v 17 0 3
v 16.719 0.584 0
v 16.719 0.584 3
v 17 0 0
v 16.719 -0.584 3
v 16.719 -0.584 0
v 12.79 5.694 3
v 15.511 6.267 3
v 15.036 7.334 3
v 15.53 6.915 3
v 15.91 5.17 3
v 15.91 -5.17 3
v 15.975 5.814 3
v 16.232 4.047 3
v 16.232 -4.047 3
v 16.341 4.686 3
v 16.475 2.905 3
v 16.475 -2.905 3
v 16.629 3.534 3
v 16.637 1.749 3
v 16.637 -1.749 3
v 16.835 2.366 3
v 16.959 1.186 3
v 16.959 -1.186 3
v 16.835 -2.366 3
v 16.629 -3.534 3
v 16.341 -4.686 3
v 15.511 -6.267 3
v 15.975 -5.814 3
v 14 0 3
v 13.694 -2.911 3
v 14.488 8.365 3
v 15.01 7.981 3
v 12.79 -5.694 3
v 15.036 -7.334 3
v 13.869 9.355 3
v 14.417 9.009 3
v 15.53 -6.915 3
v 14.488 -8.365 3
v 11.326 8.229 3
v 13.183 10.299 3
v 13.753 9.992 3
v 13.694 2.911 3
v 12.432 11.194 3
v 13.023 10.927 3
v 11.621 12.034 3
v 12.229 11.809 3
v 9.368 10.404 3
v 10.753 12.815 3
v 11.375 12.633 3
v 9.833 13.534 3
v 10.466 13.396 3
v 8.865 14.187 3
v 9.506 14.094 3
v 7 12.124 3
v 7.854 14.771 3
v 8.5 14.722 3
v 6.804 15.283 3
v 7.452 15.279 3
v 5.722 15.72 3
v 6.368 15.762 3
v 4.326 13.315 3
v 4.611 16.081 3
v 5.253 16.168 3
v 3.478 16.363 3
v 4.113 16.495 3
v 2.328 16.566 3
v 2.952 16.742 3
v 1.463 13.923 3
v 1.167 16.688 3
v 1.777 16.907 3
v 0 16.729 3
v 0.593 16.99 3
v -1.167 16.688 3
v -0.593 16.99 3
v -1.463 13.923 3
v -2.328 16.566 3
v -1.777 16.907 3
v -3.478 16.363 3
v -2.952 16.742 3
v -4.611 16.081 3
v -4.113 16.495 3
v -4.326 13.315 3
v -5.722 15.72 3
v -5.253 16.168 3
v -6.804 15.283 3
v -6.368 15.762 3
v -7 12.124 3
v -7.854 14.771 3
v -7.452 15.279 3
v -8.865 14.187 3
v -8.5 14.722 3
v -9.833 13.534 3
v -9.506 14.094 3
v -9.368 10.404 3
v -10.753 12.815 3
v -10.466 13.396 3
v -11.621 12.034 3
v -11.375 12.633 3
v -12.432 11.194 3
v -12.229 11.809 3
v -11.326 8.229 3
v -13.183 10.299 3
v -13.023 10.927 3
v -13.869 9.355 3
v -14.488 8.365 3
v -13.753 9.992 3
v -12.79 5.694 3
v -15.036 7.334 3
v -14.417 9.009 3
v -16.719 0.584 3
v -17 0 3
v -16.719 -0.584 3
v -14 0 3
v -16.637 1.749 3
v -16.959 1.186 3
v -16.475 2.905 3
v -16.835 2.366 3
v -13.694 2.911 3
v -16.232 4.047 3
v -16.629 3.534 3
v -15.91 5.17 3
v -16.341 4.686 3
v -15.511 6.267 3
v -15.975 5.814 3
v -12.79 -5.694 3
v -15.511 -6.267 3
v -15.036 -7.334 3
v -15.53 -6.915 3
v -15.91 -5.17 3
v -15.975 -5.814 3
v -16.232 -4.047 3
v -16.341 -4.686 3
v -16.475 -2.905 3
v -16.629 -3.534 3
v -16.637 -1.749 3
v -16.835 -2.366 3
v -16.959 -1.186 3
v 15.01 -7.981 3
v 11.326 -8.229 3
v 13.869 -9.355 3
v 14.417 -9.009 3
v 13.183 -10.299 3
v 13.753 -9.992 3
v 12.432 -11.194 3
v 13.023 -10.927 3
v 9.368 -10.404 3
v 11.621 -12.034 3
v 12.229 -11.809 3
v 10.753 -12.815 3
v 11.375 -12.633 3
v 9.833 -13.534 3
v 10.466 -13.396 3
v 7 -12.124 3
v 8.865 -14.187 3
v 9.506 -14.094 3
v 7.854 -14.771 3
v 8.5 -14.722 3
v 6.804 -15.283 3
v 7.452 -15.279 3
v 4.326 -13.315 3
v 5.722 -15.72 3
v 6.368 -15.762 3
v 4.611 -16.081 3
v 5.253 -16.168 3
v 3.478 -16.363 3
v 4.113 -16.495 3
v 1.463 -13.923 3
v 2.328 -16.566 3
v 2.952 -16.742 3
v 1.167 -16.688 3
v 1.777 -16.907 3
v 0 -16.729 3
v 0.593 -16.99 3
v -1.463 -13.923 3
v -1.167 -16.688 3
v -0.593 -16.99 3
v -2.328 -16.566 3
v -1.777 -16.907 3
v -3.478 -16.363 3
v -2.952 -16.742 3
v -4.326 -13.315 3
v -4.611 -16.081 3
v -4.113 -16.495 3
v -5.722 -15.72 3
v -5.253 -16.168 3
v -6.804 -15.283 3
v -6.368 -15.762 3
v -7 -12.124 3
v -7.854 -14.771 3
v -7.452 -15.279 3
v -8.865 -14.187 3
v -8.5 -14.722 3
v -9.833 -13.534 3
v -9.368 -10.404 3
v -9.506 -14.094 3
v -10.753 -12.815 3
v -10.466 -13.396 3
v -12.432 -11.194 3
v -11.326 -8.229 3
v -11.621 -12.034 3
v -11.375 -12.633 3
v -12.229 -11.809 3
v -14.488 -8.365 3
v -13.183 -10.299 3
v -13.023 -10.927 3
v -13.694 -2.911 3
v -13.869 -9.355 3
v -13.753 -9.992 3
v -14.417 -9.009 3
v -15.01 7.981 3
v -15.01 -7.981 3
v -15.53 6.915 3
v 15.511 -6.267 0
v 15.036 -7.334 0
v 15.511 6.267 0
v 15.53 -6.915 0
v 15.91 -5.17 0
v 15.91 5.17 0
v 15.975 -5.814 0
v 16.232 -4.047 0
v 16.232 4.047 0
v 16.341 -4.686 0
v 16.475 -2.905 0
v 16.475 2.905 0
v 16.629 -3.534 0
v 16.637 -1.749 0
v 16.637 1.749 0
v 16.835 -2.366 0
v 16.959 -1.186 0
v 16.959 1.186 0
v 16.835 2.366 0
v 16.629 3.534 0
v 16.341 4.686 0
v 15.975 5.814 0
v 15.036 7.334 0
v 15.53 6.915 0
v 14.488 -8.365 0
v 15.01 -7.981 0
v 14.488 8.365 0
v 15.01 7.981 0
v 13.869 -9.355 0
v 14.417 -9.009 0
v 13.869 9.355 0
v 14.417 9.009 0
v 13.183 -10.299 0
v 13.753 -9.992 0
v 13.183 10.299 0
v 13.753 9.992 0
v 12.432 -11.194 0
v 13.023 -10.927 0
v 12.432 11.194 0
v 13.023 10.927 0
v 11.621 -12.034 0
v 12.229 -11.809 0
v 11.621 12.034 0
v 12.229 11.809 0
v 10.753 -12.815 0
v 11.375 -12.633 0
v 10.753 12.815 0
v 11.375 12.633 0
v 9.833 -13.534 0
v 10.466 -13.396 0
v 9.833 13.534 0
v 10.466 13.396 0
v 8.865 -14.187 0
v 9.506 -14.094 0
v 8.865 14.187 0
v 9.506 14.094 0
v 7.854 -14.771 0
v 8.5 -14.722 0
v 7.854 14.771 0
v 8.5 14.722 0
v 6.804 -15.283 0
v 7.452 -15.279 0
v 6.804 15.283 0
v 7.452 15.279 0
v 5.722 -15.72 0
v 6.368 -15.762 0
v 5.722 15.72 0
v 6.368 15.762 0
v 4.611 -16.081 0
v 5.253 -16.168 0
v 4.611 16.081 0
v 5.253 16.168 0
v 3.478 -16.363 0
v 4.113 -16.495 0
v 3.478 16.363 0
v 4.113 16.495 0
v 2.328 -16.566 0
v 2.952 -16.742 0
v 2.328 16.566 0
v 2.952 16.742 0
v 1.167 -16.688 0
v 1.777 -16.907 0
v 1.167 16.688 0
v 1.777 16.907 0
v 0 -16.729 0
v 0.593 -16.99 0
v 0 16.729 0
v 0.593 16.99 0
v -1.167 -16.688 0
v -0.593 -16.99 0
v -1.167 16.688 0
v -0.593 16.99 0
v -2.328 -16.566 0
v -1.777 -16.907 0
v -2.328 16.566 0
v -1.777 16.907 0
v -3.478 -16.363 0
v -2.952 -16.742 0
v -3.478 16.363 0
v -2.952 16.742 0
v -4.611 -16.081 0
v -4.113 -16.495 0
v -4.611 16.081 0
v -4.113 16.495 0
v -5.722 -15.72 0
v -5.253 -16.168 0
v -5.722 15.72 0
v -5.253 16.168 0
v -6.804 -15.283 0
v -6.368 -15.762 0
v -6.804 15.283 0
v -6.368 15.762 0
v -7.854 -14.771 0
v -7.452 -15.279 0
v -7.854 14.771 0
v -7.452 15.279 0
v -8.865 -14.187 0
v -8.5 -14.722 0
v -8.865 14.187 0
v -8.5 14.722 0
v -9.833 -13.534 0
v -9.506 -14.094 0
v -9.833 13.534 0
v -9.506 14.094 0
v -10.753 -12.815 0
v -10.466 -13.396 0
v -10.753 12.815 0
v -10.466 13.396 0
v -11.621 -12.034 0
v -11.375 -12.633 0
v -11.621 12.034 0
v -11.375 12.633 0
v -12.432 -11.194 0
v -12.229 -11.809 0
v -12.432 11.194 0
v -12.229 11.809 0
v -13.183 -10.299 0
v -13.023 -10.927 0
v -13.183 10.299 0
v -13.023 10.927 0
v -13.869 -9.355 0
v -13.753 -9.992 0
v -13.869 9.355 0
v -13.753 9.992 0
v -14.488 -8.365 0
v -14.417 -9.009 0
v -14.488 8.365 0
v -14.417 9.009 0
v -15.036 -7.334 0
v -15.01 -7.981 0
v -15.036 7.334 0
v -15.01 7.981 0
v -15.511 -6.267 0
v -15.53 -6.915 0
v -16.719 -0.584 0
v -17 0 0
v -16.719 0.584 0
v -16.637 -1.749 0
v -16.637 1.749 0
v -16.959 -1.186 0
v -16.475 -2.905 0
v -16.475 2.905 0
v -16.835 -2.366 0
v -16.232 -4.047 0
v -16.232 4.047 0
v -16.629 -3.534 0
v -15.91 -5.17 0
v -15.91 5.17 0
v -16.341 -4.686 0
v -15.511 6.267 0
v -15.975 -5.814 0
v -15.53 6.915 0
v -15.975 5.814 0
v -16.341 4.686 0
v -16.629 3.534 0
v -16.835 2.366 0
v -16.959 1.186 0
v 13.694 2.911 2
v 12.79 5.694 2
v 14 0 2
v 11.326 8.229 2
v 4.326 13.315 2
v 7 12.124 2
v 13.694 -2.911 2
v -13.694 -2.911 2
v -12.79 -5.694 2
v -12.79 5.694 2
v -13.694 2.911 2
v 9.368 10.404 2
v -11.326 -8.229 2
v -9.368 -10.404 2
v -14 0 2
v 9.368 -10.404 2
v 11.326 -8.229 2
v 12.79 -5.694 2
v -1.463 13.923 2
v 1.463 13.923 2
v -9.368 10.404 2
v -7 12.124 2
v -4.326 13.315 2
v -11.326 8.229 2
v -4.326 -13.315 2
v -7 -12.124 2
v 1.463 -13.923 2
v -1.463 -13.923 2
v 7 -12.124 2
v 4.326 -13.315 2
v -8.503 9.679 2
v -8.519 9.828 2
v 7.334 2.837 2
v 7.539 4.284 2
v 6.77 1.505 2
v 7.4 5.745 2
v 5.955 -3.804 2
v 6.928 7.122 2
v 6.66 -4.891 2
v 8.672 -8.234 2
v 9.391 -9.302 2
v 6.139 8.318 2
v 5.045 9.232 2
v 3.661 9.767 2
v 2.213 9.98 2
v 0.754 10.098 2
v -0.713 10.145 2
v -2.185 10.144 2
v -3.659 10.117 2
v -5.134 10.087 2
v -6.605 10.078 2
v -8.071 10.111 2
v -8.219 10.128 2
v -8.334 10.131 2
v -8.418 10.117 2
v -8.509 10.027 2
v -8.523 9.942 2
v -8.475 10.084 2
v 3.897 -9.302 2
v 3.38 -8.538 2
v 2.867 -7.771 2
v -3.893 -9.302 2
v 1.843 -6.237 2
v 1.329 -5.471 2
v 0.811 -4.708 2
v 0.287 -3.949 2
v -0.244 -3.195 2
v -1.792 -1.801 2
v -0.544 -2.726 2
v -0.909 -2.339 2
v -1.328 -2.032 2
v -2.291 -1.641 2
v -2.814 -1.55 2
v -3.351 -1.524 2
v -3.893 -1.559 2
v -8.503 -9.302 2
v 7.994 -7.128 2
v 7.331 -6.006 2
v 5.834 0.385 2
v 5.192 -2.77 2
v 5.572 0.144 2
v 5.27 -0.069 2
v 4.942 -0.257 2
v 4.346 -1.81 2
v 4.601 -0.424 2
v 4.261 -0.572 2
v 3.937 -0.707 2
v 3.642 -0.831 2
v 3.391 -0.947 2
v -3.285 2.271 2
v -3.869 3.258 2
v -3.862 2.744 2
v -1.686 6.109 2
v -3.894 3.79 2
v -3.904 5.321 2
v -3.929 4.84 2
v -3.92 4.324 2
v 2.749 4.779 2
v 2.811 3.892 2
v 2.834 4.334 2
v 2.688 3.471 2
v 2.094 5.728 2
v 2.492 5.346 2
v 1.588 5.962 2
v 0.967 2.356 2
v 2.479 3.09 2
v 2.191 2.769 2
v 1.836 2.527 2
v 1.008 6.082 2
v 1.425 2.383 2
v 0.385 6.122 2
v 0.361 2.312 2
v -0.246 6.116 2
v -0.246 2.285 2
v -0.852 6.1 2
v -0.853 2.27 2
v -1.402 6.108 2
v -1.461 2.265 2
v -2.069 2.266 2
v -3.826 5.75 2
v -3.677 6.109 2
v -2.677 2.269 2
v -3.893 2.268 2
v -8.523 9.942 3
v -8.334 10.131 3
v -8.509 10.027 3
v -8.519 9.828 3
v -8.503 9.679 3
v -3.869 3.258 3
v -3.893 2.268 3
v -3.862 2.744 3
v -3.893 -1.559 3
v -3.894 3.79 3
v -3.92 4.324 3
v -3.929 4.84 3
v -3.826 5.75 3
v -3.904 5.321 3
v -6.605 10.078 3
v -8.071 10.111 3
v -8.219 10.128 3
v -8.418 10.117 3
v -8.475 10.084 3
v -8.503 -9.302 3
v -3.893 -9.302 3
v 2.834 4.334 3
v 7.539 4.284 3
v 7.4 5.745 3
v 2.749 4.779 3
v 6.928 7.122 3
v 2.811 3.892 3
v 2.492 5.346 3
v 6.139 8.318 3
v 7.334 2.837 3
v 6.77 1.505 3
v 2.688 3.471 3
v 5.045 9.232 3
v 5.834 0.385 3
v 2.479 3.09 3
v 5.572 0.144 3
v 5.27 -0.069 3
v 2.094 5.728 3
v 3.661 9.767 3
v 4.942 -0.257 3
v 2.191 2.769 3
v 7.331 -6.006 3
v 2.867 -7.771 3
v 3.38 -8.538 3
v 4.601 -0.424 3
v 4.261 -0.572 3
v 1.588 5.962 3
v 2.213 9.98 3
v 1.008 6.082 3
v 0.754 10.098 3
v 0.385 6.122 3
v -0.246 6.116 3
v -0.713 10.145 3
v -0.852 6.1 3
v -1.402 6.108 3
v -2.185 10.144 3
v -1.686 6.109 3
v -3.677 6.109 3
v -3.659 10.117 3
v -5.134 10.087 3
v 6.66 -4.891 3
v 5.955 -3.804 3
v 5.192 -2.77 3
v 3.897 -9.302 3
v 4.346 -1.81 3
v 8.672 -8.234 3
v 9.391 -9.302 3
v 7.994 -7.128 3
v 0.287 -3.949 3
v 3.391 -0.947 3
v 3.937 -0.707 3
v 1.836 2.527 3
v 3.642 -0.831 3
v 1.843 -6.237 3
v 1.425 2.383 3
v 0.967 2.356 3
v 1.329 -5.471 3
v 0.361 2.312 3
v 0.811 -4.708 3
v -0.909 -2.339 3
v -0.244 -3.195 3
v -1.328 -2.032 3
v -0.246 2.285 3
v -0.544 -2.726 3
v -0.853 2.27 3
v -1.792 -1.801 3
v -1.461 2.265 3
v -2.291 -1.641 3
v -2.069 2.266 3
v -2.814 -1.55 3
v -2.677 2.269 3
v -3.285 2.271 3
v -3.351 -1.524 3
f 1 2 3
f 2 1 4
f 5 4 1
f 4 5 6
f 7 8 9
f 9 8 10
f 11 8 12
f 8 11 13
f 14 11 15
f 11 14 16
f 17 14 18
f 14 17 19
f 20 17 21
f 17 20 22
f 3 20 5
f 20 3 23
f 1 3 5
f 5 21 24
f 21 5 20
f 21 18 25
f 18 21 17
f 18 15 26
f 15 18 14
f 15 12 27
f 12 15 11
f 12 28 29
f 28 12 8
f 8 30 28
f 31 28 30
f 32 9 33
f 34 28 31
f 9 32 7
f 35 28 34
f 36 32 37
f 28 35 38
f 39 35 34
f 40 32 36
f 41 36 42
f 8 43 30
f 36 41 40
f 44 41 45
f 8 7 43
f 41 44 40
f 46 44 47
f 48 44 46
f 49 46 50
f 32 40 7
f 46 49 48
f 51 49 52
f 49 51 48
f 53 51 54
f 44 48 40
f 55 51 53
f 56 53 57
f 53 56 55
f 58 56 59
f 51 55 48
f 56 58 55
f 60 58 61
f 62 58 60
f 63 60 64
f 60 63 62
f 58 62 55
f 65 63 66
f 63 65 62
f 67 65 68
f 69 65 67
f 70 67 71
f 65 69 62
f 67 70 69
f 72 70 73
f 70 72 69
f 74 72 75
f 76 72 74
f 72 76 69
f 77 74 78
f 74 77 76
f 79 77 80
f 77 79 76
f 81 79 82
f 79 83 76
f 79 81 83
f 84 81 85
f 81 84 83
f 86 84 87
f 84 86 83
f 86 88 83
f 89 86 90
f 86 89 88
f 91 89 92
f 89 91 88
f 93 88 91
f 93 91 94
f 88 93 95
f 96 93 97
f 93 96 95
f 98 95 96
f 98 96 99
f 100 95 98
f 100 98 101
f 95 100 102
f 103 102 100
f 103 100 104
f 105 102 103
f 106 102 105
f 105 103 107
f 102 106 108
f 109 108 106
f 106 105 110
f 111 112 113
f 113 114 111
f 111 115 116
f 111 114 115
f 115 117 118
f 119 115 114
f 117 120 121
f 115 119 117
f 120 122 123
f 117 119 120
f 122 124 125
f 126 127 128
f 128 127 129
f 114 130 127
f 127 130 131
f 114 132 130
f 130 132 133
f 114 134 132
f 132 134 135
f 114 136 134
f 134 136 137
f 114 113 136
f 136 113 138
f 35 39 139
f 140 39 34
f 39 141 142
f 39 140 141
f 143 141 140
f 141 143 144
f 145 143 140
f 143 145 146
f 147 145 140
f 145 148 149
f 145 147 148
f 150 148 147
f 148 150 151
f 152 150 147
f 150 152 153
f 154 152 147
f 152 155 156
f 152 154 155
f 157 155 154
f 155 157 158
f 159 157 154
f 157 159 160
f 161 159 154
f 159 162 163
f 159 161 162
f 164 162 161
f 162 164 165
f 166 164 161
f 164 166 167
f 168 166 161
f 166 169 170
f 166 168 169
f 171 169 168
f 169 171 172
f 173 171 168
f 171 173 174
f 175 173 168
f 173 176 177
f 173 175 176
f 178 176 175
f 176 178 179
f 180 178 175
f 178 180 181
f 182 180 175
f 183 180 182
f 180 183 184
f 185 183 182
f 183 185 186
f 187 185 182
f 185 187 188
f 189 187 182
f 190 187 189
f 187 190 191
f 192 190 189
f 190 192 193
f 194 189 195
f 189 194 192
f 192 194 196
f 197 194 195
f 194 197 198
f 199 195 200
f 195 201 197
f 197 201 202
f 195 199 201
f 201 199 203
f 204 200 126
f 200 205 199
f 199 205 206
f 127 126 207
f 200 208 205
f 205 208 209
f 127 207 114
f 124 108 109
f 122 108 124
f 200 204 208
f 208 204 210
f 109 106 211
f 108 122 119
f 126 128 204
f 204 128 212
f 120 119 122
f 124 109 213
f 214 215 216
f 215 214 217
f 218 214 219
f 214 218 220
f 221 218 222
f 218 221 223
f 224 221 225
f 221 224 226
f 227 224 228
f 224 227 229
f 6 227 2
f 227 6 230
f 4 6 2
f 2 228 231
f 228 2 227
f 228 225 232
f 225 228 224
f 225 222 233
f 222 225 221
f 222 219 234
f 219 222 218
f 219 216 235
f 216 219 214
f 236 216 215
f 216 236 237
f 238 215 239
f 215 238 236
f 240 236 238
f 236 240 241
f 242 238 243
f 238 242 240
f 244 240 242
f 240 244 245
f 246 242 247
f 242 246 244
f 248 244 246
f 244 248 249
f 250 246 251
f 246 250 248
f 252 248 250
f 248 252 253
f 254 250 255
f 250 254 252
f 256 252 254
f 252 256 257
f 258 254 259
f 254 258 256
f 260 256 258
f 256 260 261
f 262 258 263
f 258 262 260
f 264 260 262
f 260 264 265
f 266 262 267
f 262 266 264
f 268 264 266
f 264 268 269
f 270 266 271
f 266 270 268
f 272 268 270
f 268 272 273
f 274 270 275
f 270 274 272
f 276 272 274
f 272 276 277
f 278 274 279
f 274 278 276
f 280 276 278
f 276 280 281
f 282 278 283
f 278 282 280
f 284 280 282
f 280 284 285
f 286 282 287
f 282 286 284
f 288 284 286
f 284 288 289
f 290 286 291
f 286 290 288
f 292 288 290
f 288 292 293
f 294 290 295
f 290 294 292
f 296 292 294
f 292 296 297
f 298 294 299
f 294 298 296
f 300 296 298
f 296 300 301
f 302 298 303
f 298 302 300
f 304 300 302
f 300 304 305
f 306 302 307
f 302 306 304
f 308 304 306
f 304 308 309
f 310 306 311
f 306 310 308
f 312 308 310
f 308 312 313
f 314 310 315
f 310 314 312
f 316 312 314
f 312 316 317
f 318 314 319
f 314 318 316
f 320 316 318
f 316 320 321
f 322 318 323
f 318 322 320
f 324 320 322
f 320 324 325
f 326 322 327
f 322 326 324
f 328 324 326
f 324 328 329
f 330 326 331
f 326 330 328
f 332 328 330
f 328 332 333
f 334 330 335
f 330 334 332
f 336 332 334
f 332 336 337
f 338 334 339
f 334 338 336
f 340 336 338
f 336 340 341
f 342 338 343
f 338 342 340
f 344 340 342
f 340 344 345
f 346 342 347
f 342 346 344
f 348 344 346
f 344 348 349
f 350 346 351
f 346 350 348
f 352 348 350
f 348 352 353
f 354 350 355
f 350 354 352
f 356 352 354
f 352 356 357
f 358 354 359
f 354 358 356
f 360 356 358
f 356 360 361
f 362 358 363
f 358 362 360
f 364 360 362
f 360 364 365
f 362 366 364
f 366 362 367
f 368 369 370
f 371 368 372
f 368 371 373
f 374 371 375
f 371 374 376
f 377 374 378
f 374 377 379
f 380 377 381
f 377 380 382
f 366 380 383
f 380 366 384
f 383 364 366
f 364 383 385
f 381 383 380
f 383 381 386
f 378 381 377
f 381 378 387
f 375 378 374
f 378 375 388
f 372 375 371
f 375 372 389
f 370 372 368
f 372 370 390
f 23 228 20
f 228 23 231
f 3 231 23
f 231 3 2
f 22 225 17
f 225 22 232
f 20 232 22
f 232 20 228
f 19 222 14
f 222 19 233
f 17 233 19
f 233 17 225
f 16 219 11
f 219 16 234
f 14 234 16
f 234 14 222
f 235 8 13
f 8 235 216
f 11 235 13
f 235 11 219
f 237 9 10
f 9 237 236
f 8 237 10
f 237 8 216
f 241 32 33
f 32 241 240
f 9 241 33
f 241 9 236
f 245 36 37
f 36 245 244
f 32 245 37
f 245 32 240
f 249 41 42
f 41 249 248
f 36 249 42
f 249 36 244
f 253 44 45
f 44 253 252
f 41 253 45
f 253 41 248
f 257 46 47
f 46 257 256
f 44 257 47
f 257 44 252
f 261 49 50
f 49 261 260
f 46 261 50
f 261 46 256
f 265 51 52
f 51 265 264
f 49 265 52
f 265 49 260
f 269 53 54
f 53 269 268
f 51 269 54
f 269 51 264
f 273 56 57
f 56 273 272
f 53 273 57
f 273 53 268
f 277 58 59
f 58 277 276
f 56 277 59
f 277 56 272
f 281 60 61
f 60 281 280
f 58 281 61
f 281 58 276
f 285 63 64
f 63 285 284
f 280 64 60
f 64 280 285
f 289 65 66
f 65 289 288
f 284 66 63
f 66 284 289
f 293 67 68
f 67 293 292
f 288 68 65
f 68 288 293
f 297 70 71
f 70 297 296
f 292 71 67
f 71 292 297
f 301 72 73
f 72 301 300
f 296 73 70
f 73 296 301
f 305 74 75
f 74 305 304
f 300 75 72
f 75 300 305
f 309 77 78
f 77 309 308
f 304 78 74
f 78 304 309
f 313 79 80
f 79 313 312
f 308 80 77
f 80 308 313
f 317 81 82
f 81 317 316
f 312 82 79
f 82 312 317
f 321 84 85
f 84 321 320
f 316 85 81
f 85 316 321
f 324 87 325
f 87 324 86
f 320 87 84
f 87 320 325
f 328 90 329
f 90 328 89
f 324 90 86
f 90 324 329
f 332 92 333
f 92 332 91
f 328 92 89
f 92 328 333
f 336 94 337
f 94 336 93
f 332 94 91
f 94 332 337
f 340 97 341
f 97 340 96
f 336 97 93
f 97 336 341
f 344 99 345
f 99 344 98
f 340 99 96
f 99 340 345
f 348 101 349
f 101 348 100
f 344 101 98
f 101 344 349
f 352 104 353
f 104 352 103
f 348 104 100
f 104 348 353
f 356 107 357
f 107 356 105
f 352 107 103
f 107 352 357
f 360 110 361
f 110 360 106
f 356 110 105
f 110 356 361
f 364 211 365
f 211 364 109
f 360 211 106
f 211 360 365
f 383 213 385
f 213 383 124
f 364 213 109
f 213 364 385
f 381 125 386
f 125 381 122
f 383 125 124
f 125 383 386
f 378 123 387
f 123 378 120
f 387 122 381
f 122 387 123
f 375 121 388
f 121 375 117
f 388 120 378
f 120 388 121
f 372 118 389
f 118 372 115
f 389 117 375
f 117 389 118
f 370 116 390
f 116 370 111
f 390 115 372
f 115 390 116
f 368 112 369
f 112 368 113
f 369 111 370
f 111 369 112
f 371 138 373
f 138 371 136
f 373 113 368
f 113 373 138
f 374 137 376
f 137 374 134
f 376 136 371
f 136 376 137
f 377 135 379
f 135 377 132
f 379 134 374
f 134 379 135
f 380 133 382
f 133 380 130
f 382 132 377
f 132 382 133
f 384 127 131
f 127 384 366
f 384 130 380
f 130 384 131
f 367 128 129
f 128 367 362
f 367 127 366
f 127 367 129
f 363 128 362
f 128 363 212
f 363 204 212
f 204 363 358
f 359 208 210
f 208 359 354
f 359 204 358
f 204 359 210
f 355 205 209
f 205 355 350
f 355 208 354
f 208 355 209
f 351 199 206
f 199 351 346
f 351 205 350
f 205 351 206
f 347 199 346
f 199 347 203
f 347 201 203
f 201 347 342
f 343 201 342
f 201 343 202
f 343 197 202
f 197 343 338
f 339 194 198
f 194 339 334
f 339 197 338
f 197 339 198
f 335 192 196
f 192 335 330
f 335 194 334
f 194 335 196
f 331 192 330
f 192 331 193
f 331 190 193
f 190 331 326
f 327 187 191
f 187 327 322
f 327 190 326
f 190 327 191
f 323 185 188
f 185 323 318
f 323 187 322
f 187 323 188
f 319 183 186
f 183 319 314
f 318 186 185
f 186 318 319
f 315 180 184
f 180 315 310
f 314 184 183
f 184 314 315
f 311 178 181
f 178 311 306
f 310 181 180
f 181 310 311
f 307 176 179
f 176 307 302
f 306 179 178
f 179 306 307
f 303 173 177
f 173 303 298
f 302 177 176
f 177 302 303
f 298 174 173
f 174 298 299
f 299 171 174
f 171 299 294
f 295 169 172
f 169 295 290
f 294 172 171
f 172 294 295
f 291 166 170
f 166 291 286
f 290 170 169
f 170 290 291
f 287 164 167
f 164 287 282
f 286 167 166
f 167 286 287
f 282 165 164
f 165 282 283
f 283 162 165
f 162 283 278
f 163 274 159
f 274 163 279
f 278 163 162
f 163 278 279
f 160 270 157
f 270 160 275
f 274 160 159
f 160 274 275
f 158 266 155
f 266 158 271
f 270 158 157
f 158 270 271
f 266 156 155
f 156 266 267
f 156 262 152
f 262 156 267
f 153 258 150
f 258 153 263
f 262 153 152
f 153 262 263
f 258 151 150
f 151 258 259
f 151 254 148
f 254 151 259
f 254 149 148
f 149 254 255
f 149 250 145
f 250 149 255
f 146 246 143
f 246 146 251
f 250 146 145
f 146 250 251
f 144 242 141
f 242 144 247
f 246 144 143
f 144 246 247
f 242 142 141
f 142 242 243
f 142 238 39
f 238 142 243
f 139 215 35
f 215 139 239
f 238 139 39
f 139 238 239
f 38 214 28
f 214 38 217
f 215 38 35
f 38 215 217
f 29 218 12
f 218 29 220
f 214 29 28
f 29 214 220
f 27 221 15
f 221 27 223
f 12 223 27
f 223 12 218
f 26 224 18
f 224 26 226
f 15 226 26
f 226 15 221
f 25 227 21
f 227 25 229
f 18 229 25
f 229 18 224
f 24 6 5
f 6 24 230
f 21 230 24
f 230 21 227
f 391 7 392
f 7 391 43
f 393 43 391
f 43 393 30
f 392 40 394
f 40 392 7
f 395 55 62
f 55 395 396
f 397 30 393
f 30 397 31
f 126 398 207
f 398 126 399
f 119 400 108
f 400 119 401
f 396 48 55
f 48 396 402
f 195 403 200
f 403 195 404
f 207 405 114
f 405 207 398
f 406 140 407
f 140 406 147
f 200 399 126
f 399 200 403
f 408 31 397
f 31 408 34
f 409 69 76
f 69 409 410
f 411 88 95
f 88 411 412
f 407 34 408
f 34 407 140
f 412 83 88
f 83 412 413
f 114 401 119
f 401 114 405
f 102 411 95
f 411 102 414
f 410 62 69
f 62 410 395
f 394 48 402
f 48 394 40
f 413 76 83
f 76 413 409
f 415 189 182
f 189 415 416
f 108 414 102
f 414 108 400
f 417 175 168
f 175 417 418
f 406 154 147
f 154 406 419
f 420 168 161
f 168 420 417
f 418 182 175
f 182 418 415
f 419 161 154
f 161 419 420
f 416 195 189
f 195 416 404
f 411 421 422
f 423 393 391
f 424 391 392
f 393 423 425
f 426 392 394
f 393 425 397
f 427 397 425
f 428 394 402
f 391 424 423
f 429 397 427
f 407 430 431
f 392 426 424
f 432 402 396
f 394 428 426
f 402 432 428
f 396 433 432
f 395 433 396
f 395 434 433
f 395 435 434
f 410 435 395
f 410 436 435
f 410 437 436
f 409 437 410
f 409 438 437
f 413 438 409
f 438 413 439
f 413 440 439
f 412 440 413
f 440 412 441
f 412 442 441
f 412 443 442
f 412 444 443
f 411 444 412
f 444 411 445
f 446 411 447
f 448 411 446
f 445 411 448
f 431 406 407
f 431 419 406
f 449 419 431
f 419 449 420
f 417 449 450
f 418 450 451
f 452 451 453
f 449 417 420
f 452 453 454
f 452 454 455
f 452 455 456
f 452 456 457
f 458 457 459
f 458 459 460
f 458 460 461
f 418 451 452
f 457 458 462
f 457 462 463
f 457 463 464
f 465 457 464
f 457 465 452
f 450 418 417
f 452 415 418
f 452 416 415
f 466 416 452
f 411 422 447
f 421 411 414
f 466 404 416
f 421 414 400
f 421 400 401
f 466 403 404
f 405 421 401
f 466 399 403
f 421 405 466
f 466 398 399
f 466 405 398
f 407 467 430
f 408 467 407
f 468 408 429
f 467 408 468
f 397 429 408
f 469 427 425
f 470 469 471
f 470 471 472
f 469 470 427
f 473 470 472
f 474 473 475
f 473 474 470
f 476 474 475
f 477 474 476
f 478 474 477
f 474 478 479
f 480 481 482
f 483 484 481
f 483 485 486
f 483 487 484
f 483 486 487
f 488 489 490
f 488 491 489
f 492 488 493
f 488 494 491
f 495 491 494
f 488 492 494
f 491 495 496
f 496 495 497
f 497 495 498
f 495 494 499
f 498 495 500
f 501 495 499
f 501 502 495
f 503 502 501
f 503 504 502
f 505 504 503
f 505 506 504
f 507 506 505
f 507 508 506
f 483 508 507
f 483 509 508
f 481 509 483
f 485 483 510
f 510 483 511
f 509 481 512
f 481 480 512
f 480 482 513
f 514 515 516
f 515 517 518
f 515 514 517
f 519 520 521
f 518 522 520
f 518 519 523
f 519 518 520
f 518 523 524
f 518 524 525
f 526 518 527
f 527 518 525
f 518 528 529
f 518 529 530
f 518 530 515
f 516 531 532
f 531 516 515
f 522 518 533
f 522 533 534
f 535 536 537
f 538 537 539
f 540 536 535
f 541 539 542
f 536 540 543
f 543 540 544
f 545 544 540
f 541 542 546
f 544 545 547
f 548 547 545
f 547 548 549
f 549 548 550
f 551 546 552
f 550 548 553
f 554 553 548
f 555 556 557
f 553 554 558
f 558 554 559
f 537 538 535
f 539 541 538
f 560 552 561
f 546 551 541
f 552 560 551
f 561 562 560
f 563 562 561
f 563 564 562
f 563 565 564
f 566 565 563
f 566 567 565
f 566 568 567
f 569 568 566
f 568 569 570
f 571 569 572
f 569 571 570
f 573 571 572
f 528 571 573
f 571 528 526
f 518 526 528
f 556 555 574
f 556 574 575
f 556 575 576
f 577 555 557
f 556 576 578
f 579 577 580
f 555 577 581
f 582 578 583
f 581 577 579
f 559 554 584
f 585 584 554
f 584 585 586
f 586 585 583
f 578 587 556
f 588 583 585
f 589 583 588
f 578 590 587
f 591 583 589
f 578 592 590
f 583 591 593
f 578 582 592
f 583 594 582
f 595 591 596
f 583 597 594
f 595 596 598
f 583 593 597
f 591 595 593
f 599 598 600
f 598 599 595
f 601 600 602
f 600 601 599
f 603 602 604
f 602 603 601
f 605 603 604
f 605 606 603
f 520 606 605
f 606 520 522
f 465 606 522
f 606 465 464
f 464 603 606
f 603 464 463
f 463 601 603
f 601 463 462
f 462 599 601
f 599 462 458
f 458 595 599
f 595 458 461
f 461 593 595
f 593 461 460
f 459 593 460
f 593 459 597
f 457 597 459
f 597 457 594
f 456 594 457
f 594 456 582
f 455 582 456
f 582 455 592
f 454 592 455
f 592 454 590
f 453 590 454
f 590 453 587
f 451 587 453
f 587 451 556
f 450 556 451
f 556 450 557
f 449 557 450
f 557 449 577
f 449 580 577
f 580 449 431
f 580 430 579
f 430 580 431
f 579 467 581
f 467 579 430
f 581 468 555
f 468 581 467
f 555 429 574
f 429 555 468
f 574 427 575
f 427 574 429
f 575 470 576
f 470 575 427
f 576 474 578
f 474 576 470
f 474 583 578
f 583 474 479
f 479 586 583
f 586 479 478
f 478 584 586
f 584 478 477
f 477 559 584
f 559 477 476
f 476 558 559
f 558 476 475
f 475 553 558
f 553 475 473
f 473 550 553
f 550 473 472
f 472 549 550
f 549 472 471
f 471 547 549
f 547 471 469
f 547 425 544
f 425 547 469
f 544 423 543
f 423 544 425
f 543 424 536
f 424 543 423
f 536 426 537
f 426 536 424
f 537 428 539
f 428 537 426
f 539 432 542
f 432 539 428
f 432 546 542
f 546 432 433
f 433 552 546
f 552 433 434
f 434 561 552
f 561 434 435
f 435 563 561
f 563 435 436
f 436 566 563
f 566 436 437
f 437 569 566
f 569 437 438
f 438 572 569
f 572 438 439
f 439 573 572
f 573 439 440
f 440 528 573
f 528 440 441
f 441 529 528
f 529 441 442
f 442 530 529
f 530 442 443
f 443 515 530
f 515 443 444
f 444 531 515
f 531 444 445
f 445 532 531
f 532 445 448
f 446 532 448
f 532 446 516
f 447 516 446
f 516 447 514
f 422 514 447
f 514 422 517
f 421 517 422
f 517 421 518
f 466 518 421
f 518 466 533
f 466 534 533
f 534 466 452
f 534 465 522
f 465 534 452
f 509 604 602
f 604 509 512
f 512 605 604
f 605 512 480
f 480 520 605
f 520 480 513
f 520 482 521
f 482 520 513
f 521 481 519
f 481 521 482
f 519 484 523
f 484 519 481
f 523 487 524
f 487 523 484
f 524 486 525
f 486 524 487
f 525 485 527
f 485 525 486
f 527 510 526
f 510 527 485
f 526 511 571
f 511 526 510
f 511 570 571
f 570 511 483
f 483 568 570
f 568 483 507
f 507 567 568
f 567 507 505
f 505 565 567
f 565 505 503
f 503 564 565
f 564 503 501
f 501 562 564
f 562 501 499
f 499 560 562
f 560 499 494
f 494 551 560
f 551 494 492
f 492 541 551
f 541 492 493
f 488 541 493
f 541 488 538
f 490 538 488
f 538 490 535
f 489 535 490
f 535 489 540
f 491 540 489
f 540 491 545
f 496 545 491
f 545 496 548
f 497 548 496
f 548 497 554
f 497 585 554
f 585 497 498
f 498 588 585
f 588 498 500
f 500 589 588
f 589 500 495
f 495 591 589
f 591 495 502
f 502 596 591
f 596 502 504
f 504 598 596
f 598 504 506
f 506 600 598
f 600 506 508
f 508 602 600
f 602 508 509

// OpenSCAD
module coin() {
  for(n=[0:90]) {
    rotate([0,0,n*4]) translate([15,0,0]) cylinder(r = 2, h = 3);
  }
  cylinder(r = 14, h = 3);
}

difference() {
  coin();
  translate([0,0,2]) cylinder(r = 14, h = 2);
}
translate([-11.5,-11,2]) scale([0.27,0.27,1]) linear_extrude(file = "r.dxf", height = 2, center = true);
